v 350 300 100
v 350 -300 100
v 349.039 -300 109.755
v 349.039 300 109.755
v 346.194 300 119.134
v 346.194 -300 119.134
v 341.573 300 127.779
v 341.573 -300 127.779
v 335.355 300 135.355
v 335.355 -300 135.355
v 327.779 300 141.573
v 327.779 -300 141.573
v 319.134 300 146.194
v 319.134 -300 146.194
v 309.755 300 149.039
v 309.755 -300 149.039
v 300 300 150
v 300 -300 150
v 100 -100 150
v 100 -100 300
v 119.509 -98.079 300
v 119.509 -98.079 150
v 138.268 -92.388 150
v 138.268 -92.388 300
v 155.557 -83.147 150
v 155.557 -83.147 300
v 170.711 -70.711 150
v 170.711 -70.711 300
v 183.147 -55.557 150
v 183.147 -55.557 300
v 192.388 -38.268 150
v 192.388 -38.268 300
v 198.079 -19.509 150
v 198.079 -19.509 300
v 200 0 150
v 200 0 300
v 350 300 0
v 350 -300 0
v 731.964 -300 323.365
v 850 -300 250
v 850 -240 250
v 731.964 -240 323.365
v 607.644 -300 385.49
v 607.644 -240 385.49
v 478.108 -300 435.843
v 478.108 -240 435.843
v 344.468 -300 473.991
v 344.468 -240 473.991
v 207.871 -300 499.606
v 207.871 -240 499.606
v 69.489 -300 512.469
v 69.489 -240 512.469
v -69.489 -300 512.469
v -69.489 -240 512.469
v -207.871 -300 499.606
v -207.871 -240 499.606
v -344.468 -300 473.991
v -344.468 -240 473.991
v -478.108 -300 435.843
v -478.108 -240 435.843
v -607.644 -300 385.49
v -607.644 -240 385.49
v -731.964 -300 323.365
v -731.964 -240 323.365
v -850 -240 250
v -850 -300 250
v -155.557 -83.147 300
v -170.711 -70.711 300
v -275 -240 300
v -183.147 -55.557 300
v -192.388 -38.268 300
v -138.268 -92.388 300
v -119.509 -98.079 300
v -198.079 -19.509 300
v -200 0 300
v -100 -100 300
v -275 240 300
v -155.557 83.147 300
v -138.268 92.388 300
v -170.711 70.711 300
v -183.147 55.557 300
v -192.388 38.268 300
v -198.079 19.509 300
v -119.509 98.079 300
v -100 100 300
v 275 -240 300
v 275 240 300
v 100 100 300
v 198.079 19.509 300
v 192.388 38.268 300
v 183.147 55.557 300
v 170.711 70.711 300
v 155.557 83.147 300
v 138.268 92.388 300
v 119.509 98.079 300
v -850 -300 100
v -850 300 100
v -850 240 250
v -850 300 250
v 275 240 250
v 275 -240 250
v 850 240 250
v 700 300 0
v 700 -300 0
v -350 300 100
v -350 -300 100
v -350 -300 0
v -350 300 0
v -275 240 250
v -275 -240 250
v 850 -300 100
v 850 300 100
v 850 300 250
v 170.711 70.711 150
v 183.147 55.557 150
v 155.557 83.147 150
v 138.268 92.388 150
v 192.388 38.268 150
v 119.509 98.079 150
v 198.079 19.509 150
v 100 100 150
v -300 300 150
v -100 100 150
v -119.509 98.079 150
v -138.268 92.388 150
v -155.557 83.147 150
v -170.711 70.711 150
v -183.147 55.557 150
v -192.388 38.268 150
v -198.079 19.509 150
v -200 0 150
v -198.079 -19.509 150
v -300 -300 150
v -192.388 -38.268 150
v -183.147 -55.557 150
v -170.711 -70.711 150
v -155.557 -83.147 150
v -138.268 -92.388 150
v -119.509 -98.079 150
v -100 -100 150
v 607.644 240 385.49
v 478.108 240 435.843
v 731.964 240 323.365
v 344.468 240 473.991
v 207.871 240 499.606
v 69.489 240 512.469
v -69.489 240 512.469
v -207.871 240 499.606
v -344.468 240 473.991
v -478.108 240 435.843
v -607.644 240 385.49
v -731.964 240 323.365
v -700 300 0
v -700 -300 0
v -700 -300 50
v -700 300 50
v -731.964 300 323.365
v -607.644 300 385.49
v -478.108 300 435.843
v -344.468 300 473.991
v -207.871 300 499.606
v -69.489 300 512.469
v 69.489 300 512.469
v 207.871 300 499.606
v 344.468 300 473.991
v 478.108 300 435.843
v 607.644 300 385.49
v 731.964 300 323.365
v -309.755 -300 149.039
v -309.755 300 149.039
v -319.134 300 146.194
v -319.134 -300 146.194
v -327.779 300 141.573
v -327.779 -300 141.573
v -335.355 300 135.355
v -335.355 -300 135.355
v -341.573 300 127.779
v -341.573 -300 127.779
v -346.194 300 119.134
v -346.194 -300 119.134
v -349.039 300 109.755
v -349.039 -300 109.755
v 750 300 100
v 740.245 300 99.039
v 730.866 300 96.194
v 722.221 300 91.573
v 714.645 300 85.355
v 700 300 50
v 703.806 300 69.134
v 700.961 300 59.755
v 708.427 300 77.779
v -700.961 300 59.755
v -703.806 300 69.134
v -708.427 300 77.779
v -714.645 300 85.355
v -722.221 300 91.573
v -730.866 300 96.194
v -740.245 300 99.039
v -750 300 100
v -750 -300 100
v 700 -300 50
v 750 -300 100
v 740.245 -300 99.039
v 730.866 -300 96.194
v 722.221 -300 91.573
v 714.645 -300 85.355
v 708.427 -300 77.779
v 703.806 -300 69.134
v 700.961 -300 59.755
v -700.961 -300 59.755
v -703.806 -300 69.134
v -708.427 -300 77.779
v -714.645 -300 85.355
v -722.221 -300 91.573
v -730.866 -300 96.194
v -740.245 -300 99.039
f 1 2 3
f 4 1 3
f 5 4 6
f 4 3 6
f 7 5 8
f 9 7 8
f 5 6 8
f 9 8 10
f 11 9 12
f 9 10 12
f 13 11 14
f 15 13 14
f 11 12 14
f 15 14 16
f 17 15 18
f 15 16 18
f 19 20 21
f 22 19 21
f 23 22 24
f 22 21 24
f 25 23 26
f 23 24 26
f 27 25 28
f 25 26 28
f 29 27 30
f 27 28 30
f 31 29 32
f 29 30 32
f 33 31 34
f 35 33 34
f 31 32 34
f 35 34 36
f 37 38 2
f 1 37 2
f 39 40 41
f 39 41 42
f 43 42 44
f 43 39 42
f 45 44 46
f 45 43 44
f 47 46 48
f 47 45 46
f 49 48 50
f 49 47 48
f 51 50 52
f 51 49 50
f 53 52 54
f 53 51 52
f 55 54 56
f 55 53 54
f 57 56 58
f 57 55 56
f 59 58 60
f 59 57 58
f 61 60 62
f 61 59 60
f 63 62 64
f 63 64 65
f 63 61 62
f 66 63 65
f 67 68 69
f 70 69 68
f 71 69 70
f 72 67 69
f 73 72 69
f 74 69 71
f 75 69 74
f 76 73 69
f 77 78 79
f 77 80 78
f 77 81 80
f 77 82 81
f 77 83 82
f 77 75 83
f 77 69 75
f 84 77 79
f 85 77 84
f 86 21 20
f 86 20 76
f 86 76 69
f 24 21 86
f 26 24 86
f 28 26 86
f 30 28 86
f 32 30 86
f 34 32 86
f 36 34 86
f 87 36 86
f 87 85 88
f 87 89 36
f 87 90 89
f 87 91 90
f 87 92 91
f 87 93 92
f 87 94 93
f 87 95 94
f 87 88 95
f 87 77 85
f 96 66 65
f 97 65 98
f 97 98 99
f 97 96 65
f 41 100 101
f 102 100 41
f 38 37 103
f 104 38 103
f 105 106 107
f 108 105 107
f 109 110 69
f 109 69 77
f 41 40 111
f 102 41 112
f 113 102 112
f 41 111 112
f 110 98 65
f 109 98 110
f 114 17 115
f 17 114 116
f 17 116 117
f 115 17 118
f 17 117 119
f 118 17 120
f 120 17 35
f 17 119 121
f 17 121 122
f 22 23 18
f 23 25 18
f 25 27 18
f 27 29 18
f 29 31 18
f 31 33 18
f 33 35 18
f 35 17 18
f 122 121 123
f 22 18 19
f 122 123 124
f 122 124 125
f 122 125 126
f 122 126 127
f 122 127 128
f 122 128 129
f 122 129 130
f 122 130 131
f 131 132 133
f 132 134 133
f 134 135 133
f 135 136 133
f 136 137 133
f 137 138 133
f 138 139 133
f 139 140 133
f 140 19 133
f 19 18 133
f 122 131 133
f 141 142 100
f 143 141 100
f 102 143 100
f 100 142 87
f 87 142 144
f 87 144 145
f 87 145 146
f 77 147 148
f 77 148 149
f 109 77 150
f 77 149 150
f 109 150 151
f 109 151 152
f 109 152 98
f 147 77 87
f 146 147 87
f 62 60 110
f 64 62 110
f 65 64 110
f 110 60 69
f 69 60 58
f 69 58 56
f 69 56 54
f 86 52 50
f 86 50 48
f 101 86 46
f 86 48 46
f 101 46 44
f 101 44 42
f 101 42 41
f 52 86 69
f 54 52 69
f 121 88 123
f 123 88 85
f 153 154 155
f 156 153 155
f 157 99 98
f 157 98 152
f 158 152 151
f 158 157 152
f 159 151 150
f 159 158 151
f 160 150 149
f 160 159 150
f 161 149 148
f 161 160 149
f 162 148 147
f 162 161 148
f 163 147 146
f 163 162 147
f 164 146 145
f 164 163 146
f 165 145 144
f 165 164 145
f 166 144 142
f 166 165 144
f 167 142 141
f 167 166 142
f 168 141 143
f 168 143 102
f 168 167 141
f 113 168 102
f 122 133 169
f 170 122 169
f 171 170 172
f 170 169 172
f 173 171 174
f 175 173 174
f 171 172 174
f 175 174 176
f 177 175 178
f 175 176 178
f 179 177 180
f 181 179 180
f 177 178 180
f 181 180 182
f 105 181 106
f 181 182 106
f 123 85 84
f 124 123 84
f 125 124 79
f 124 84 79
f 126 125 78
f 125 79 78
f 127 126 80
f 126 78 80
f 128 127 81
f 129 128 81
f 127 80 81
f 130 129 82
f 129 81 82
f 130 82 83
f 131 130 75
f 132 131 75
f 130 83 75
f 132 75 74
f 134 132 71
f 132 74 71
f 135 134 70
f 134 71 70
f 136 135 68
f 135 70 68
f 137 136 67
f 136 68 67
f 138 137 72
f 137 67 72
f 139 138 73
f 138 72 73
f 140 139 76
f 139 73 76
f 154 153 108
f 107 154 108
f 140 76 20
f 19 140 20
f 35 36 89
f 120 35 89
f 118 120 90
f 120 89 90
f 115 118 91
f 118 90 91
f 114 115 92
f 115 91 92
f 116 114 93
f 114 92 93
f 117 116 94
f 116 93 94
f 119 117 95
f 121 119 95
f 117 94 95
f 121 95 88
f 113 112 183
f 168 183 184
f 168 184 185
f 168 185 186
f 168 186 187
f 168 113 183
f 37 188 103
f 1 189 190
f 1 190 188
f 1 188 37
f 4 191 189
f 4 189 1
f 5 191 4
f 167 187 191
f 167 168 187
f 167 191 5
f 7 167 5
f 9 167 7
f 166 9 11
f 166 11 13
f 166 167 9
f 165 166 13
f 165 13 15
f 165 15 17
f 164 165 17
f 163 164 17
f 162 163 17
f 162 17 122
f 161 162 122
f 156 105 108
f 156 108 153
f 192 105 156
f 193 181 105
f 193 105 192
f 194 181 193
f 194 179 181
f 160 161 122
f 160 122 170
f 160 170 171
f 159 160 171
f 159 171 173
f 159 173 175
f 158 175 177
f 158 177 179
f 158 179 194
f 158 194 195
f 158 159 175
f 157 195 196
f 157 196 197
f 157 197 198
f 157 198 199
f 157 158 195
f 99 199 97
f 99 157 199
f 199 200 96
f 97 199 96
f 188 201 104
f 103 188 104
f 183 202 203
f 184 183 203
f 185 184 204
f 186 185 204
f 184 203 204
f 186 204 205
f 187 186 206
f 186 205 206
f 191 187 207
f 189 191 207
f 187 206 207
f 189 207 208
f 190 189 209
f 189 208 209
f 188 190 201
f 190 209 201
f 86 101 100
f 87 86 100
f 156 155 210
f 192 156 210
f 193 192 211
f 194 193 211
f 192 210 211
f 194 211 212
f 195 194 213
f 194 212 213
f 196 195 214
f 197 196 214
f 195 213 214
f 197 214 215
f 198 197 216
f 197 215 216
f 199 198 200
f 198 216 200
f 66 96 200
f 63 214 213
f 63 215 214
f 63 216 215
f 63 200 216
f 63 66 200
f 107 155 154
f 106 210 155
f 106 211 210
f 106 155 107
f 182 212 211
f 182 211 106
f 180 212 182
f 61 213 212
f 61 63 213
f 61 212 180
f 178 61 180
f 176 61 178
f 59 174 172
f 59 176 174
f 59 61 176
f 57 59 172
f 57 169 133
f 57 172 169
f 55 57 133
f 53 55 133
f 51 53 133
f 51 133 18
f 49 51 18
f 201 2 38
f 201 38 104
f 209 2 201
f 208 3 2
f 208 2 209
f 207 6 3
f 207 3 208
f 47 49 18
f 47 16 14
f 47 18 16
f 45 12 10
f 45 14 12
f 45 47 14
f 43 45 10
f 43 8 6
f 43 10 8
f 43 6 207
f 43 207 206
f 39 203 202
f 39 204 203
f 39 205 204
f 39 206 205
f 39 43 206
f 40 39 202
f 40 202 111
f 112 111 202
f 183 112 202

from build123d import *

# Parameters (mm, degrees)
F0_W      = 1700
F0_H      = 600
F1_DEPTH  = 250
F2_W      = 550
F2_H      = 480
F3_DEPTH  = 50
F5_DEPTH  = 300.001
F7_DEPTH  = 600.001
F9_DEPTH  = 600.001
F12_DEPTH = 60
F13_DEPTH = 60


with BuildPart() as f1:
    # F0 (on Top) → F1 (new body)
    with BuildSketch(Plane.XY):
        Rectangle(F0_W, F0_H)
    extrude(amount=F1_DEPTH)

    # F2 (on face) → F3 (join)
    with BuildSketch(Plane.XY.offset(250)):
        Rectangle(F2_W, F2_H)
    extrude(amount=F3_DEPTH)

    # F4 (on face) → F5 (cut, through all)
    with BuildSketch(Plane.XY.offset(300)):
        with BuildLine():
            ThreePointArc((-100, 100), (-200, 0), (-100, -100))
            Line((-100, -100), (-100, 100))
        make_face()
        with BuildLine():
            Line((-100, 100), (-100, -100))
            ThreePointArc((-100, -100), (-29.2893218813, -70.7106781187), (0, 0))
            ThreePointArc((0, 0), (-29.2893218813, 70.7106781187), (-100, 100))
        make_face()
        with BuildLine():
            ThreePointArc((0, 0), (29.2893218813, -70.7106781187), (100, -100))
            Line((100, -100), (100, 100))
            ThreePointArc((100, 100), (29.2893218813, 70.7106781187), (0, 0))
        make_face()
        with BuildLine():
            Line((100, 100), (100, -100))
            ThreePointArc((100, -100), (170.7106781187, -70.7106781187), (200, 0))
            ThreePointArc((200, 0), (170.7106781187, 70.7106781187), (100, 100))
        make_face()
        with BuildLine():
            ThreePointArc((0, 0), (29.2893218813, 70.7106781187), (100, 100))
            Line((100, 100), (-100, 100))
            ThreePointArc((-100, 100), (-29.2893218813, 70.7106781187), (0, 0))
        make_face()
        with BuildLine():
            Line((-100, -100), (100, -100))
            ThreePointArc((100, -100), (29.2893218813, -70.7106781187), (0, 0))
            ThreePointArc((0, 0), (-29.2893218813, -70.7106781187), (-100, -100))
        make_face()
    extrude(amount=-F5_DEPTH, mode=Mode.SUBTRACT)

    # F6 (on face) → F7 (cut, through all)
    with BuildSketch(Plane.XZ.offset(300)):
        with BuildLine():
            Line((-350, 0), (0, 0))
            Line((0, 0), (0, 150))
            Line((0, 150), (-300, 150))
            ThreePointArc((-300, 150), (-335.3553390593, 135.3553390593), (-350, 100))
            Line((-350, 100), (-350, 0))
        make_face()
        with BuildLine():
            Line((0, 150), (0, 0))
            Line((0, 0), (350, 0))
            Line((350, 0), (350, 100))
            ThreePointArc((350, 100), (335.3553390593, 135.3553390593), (300, 150))
            Line((300, 150), (0, 150))
        make_face()
    extrude(amount=-F7_DEPTH, mode=Mode.SUBTRACT)

    # F8 (on face) → F9 (cut, through all)
    with BuildSketch(Plane.XZ.offset(300)):
        with BuildLine():
            Line((850, 0), (850, 100))
            Line((850, 100), (750, 100))
            ThreePointArc((750, 100), (714.6446609407, 85.3553390593), (700, 50))
            Line((700, 50), (700, 0))
            Line((700, 0), (850, 0))
        make_face()
        with BuildLine():
            Line((-850, 100), (-850, 0))
            Line((-850, 0), (-700, 0))
            Line((-700, 0), (-700, 50))
            ThreePointArc((-700, 50), (-714.6446609407, 85.3553390593), (-750, 100))
            Line((-750, 100), (-850, 100))
        make_face()
    extrude(amount=-F9_DEPTH, mode=Mode.SUBTRACT)

    # F11 (on face) → F12 (join)
    with BuildSketch(Plane(origin=(0, 300, 0), x_dir=(-1, 0, 0), z_dir=(0, 1, 0))):
        with BuildLine():
            Line((-850, 250), (850, 250))
            ThreePointArc((850, 250), (0, 514.0792905692), (-850, 250))
        make_face()
    extrude(amount=-F12_DEPTH)

    # F10 (on face) → F13 (join)
    with BuildSketch(Plane.XZ.offset(300)):
        with BuildLine():
            Line((-850, 250), (850, 250))
            ThreePointArc((850, 250), (0, 514.0792905692), (-850, 250))
        make_face()
    extrude(amount=-F13_DEPTH)


solid = f1.part
